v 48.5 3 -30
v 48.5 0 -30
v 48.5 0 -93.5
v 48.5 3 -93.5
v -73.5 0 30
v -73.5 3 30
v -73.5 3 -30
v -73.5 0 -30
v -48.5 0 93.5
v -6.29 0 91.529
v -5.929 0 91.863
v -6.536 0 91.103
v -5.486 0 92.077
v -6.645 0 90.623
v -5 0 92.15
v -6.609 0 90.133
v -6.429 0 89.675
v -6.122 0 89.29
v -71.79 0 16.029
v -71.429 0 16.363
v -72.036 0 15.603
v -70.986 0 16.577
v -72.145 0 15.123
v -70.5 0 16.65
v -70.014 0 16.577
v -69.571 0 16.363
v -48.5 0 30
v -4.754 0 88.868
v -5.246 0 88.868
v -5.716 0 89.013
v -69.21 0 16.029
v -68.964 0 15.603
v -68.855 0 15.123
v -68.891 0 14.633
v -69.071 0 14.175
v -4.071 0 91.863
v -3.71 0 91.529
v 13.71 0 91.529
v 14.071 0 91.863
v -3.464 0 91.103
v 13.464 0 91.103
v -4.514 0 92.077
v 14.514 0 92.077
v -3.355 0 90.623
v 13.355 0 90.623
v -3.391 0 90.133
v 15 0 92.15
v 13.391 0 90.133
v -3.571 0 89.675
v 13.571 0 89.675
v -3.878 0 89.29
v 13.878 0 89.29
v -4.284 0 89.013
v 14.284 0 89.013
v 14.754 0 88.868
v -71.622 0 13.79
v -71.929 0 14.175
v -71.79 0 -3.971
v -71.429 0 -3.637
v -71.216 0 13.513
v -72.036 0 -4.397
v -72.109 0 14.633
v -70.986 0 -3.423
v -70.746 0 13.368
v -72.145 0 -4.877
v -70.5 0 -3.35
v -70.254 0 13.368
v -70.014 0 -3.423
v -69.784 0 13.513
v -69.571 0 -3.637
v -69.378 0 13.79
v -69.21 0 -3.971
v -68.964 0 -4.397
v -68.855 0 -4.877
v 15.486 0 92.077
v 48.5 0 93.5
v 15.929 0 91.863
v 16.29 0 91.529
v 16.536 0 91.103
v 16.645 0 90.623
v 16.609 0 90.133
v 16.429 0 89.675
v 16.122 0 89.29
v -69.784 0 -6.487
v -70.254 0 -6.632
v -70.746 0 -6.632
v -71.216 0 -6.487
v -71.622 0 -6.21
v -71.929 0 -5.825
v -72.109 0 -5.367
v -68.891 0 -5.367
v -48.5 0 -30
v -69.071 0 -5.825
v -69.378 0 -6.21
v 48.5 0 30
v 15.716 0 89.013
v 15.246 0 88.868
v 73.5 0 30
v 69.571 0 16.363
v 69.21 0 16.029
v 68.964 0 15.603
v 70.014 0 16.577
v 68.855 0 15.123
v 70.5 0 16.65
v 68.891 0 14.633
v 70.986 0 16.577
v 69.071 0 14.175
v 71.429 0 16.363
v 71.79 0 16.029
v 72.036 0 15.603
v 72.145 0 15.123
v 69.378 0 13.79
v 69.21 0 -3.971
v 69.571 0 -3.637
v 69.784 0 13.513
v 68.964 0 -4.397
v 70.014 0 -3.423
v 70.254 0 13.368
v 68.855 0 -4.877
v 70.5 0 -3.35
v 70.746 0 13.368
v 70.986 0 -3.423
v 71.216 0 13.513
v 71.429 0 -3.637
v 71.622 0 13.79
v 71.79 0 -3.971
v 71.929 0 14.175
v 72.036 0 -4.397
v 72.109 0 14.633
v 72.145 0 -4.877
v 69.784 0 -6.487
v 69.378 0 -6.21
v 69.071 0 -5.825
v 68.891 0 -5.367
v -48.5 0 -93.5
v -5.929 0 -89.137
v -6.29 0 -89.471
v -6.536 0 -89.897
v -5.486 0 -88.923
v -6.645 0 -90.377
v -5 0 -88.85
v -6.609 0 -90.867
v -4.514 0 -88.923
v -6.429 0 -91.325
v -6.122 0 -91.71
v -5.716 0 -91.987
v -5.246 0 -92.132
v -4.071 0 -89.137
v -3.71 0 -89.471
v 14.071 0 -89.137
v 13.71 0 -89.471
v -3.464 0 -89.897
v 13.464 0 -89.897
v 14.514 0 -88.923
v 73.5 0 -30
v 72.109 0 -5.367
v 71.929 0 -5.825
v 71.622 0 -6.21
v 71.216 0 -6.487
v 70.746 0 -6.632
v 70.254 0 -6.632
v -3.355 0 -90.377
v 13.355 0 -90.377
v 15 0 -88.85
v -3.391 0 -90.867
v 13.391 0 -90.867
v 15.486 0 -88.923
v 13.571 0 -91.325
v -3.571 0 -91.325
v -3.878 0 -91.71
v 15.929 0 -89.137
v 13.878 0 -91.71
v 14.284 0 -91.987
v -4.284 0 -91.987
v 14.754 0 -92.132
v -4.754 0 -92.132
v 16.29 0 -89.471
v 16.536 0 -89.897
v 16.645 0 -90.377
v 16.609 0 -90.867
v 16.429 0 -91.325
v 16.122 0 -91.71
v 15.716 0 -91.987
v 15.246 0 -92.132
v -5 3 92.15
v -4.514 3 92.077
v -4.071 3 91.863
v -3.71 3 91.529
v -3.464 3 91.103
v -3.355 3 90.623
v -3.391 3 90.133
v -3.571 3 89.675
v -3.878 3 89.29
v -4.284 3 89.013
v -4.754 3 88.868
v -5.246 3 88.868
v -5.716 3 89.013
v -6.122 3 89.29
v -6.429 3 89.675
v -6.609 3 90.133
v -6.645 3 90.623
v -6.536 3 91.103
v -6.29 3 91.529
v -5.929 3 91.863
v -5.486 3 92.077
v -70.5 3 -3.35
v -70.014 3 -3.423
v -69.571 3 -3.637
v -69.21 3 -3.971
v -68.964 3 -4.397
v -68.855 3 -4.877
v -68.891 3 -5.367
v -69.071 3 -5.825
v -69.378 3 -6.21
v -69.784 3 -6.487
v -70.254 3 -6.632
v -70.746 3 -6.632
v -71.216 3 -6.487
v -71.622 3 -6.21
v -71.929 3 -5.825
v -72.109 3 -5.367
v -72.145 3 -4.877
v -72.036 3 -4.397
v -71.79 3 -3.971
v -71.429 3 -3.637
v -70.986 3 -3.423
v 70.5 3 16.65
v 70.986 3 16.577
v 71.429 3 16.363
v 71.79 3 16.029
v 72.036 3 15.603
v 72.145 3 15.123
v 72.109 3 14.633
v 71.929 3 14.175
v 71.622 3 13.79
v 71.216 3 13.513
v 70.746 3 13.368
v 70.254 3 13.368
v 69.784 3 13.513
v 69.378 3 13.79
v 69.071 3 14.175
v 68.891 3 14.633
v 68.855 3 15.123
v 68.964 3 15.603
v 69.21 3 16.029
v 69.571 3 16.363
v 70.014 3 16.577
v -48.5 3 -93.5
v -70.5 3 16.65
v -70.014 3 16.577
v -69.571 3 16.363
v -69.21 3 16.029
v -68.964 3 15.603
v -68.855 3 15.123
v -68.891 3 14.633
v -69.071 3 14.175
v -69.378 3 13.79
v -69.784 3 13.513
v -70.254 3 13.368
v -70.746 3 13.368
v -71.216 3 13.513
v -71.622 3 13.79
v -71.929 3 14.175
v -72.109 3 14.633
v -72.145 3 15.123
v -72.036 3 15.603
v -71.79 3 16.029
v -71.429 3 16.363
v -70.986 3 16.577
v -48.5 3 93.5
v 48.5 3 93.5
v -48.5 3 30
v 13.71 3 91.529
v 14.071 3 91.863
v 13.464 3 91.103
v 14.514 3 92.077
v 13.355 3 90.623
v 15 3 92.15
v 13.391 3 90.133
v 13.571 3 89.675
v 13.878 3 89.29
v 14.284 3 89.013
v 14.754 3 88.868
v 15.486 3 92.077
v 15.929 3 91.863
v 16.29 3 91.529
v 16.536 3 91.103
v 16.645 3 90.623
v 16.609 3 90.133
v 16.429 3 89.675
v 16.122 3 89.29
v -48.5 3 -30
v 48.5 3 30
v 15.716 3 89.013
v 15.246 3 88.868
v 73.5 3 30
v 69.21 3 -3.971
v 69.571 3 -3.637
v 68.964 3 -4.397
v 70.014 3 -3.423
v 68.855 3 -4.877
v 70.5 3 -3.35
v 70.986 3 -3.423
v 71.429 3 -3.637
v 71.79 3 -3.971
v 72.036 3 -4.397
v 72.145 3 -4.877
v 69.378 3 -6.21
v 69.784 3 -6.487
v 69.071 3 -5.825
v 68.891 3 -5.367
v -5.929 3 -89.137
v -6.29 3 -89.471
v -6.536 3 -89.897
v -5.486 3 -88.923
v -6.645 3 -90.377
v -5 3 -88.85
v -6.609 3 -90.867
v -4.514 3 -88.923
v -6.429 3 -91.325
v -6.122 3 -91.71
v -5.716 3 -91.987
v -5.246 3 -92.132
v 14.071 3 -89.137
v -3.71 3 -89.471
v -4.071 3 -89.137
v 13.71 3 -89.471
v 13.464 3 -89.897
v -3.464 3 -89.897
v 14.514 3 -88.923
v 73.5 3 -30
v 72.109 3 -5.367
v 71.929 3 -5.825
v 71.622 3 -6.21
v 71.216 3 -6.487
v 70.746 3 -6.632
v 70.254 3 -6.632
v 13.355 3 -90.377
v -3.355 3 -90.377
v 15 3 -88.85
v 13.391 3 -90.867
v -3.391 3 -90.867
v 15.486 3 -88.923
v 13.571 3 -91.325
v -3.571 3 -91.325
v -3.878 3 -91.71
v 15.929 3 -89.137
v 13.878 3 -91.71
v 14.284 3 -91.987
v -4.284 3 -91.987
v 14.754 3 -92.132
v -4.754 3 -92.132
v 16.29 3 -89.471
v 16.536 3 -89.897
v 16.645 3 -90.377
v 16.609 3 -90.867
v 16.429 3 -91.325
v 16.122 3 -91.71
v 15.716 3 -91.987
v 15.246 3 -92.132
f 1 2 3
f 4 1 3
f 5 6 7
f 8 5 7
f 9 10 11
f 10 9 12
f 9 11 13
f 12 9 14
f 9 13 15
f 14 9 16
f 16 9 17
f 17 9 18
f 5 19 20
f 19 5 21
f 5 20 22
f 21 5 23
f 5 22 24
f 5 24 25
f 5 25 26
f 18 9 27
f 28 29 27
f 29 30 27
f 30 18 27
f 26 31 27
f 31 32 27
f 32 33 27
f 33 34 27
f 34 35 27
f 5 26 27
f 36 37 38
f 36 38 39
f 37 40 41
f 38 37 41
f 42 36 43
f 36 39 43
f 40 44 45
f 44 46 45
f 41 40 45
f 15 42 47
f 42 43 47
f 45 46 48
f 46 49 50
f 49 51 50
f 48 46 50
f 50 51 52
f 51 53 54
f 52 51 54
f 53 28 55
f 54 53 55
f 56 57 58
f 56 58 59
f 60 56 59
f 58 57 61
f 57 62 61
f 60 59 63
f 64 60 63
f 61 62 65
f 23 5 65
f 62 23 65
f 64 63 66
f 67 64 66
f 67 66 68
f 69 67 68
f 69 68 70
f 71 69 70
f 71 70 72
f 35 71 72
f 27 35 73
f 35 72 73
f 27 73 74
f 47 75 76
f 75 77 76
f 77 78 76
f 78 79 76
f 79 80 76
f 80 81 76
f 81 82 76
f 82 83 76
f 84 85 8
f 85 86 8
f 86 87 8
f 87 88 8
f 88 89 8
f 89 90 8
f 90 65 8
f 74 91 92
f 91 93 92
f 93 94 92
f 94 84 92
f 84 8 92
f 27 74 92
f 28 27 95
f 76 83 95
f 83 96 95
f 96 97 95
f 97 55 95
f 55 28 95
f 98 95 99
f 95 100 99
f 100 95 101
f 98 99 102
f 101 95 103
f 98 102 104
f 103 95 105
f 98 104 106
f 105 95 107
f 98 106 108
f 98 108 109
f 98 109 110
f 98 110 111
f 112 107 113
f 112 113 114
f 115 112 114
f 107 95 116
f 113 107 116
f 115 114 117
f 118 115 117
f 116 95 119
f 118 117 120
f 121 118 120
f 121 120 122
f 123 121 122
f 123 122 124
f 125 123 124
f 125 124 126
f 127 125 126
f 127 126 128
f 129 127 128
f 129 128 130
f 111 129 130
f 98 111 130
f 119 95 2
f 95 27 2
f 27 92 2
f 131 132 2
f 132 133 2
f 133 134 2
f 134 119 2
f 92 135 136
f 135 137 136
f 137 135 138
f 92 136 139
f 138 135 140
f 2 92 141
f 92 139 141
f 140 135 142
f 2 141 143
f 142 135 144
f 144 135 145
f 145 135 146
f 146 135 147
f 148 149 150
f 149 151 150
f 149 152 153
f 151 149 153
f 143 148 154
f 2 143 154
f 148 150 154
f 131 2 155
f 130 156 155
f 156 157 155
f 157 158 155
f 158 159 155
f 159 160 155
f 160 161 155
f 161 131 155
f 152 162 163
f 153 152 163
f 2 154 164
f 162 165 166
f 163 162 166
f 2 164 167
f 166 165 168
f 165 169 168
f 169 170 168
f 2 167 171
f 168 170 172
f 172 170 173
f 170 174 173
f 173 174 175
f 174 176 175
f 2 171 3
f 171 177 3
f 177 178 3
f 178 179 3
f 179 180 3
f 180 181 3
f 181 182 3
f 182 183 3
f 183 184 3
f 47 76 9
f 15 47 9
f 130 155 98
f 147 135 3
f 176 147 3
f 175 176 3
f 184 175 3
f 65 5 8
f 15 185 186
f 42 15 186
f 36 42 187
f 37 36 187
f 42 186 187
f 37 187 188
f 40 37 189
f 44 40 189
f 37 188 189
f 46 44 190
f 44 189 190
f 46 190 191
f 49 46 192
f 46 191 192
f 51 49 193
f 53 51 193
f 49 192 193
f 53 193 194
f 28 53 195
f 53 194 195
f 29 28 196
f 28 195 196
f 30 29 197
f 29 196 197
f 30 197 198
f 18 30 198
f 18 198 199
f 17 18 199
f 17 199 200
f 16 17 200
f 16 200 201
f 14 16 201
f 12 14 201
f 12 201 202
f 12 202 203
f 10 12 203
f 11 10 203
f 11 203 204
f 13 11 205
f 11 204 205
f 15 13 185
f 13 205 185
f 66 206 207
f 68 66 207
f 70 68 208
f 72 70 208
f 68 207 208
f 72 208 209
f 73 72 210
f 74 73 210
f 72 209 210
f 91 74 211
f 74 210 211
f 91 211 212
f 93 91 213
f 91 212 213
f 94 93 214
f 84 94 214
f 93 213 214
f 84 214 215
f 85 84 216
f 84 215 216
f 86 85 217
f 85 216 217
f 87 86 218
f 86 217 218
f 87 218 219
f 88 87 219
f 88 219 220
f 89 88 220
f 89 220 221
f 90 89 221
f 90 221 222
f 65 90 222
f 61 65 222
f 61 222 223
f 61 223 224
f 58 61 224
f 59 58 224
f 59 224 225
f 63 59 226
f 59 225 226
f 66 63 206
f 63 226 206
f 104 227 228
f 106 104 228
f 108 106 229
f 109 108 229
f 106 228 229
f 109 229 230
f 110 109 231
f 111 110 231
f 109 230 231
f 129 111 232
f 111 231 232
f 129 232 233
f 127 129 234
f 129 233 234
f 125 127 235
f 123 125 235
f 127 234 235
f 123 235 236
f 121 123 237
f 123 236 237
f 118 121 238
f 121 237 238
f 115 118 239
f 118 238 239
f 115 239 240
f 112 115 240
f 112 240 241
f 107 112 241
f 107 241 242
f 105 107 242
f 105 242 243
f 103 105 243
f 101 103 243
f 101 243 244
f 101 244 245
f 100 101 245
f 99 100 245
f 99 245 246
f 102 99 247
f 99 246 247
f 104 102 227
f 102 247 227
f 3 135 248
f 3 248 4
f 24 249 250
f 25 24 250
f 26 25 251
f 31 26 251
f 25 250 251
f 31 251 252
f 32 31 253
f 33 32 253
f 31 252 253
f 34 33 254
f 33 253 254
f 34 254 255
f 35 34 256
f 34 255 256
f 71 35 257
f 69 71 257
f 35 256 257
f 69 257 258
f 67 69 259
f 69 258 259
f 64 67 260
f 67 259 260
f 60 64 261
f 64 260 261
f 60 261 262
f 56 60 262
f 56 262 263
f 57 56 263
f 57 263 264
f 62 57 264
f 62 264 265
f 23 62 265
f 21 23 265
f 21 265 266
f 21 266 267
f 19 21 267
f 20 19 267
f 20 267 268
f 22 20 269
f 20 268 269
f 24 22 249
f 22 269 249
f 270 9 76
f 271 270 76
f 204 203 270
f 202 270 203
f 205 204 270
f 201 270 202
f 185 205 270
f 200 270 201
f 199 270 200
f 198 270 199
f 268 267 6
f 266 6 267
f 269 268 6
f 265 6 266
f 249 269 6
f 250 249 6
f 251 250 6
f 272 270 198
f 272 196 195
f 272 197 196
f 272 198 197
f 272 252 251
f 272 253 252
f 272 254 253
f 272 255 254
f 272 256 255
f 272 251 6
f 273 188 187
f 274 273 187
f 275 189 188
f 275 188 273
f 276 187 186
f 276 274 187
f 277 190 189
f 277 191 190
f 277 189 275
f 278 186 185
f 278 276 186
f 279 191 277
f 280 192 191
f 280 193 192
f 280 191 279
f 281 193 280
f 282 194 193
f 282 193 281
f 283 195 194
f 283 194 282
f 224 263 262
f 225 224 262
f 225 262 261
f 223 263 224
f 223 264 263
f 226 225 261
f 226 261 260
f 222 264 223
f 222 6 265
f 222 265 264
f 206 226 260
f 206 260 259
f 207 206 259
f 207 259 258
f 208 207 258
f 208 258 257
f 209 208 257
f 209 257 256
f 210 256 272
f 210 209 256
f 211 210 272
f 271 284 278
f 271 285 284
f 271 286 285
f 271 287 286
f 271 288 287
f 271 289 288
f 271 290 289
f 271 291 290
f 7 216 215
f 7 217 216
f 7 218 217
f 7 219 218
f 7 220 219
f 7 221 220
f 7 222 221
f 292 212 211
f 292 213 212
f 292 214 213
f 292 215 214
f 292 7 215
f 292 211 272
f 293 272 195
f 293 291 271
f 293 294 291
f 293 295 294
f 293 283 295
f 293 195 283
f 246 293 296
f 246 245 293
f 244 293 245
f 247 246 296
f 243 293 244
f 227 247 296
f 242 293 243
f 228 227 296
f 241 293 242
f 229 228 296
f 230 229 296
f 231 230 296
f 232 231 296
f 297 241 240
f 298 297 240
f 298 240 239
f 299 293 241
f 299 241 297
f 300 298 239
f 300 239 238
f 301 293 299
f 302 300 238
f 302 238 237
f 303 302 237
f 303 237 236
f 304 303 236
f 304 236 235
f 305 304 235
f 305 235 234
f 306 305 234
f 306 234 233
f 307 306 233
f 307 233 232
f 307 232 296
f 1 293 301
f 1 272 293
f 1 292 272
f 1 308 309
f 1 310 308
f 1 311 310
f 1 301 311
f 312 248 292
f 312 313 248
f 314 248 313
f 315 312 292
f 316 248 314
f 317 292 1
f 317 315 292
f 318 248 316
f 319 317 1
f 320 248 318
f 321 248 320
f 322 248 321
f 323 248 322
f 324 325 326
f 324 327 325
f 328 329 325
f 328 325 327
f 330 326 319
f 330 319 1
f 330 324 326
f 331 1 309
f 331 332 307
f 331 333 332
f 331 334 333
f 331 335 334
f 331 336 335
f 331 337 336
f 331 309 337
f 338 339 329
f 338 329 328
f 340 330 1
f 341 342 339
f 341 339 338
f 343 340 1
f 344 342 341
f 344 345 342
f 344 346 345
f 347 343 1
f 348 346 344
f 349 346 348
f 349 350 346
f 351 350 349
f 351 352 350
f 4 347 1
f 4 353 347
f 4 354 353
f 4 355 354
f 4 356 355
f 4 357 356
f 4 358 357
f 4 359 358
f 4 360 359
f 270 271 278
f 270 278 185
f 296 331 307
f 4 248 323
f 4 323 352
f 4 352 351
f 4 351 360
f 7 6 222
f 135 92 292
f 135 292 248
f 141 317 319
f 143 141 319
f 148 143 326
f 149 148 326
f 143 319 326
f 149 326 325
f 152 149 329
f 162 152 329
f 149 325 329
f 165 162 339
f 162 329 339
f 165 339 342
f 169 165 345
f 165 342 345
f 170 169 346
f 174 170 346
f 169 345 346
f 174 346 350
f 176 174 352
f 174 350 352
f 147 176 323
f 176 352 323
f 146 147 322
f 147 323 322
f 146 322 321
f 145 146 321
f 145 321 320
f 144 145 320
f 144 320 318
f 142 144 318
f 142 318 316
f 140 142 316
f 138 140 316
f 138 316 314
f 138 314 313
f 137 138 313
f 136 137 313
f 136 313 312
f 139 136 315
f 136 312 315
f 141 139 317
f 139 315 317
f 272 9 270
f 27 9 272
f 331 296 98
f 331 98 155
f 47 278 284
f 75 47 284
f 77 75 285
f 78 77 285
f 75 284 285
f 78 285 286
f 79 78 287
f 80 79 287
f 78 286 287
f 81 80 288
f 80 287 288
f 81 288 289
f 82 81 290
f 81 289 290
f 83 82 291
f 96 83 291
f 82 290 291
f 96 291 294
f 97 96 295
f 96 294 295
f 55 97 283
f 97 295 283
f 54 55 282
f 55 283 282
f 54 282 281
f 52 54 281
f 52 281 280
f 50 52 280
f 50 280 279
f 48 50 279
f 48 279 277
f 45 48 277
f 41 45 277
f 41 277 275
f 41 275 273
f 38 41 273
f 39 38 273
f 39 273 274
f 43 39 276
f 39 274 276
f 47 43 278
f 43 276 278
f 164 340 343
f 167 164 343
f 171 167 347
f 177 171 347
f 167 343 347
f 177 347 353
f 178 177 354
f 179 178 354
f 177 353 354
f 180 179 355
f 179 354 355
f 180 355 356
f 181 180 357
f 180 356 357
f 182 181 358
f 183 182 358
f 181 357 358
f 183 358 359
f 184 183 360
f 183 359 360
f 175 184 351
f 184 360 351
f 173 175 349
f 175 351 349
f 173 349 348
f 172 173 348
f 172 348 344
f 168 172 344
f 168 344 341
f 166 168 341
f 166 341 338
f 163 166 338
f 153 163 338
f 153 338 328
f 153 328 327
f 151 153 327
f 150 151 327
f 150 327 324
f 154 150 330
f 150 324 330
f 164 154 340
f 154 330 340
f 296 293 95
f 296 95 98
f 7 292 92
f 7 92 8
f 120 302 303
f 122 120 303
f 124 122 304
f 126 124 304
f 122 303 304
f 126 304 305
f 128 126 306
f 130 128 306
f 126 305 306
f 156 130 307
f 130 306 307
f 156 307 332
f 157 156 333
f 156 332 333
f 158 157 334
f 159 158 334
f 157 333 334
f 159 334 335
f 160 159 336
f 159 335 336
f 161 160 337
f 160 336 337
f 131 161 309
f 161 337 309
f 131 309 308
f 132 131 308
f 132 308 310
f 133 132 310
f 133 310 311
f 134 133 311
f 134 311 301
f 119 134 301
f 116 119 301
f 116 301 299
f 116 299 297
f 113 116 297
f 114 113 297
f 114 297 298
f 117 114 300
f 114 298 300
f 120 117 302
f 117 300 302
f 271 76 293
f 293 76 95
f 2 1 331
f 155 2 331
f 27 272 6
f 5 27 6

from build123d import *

# Parameters (mm, degrees)
SKETCH_1_W          = 97
SKETCH_1_H          = 187
EXTRUDE_1_DEPTH     = 3
SKETCH_4_W          = 25
SKETCH_4_H          = 60
EXTRUDE_2_DEPTH     = 3
SKETCH_6_R          = 1.65
CUT_EXTRUDE_5_DEPTH = 3


with BuildPart() as part:
    # 草图1 → 凸台-拉伸1 (new body)
    with BuildSketch(Plane(origin=(0, 0, 0), x_dir=(1, 0, 0), z_dir=(0, 1, 0))):
        Rectangle(SKETCH_1_W, SKETCH_1_H)
    extrude(amount=EXTRUDE_1_DEPTH)

    # 草图4 → 凸台-拉伸2 (add)
    with BuildSketch(Plane(origin=(0, 3, 0), x_dir=(1, 0, 0), z_dir=(0, 1, 0))):
        with Locations((61, 0)):
            Rectangle(SKETCH_4_W, SKETCH_4_H)
    extrude_2 = extrude(amount=-EXTRUDE_2_DEPTH)

    # 镜向1: 凸台-拉伸2 across plane
    add(extrude_2.mirror(Plane(origin=(0, 0, 0), x_dir=(0, 0, 1), z_dir=(1, 0, 0))))

    # 草图6 → 切除-拉伸5 (cut)
    with BuildSketch(Plane(origin=(0, 3, 0), x_dir=(1, 0, 0), z_dir=(0, 1, 0))):
        with Locations(Location((-5, -90.5, 0), (0, 0, 270))):
            Circle(SKETCH_6_R)
        with Locations(Location((15, -90.5, 0), (0, 0, 270))):
            Circle(SKETCH_6_R)
        with Locations(Location((70.5, -15, 0), (0, 0, 270))):
            Circle(SKETCH_6_R)
        with Locations(Location((70.5, 5, 0), (0, 0, 270))):
            Circle(SKETCH_6_R)
        with Locations(Location((15, 90.5, 0), (0, 0, 270))):
            Circle(SKETCH_6_R)
        with Locations(Location((-5, 90.5, 0), (0, 0, 270))):
            Circle(SKETCH_6_R)
        with Locations(Location((-70.5, -15, 0), (0, 0, 270))):
            Circle(SKETCH_6_R)
        with Locations(Location((-70.5, 5, 0), (0, 0, 270))):
            Circle(SKETCH_6_R)
    extrude(amount=-CUT_EXTRUDE_5_DEPTH, mode=Mode.SUBTRACT)


solid = part.part
